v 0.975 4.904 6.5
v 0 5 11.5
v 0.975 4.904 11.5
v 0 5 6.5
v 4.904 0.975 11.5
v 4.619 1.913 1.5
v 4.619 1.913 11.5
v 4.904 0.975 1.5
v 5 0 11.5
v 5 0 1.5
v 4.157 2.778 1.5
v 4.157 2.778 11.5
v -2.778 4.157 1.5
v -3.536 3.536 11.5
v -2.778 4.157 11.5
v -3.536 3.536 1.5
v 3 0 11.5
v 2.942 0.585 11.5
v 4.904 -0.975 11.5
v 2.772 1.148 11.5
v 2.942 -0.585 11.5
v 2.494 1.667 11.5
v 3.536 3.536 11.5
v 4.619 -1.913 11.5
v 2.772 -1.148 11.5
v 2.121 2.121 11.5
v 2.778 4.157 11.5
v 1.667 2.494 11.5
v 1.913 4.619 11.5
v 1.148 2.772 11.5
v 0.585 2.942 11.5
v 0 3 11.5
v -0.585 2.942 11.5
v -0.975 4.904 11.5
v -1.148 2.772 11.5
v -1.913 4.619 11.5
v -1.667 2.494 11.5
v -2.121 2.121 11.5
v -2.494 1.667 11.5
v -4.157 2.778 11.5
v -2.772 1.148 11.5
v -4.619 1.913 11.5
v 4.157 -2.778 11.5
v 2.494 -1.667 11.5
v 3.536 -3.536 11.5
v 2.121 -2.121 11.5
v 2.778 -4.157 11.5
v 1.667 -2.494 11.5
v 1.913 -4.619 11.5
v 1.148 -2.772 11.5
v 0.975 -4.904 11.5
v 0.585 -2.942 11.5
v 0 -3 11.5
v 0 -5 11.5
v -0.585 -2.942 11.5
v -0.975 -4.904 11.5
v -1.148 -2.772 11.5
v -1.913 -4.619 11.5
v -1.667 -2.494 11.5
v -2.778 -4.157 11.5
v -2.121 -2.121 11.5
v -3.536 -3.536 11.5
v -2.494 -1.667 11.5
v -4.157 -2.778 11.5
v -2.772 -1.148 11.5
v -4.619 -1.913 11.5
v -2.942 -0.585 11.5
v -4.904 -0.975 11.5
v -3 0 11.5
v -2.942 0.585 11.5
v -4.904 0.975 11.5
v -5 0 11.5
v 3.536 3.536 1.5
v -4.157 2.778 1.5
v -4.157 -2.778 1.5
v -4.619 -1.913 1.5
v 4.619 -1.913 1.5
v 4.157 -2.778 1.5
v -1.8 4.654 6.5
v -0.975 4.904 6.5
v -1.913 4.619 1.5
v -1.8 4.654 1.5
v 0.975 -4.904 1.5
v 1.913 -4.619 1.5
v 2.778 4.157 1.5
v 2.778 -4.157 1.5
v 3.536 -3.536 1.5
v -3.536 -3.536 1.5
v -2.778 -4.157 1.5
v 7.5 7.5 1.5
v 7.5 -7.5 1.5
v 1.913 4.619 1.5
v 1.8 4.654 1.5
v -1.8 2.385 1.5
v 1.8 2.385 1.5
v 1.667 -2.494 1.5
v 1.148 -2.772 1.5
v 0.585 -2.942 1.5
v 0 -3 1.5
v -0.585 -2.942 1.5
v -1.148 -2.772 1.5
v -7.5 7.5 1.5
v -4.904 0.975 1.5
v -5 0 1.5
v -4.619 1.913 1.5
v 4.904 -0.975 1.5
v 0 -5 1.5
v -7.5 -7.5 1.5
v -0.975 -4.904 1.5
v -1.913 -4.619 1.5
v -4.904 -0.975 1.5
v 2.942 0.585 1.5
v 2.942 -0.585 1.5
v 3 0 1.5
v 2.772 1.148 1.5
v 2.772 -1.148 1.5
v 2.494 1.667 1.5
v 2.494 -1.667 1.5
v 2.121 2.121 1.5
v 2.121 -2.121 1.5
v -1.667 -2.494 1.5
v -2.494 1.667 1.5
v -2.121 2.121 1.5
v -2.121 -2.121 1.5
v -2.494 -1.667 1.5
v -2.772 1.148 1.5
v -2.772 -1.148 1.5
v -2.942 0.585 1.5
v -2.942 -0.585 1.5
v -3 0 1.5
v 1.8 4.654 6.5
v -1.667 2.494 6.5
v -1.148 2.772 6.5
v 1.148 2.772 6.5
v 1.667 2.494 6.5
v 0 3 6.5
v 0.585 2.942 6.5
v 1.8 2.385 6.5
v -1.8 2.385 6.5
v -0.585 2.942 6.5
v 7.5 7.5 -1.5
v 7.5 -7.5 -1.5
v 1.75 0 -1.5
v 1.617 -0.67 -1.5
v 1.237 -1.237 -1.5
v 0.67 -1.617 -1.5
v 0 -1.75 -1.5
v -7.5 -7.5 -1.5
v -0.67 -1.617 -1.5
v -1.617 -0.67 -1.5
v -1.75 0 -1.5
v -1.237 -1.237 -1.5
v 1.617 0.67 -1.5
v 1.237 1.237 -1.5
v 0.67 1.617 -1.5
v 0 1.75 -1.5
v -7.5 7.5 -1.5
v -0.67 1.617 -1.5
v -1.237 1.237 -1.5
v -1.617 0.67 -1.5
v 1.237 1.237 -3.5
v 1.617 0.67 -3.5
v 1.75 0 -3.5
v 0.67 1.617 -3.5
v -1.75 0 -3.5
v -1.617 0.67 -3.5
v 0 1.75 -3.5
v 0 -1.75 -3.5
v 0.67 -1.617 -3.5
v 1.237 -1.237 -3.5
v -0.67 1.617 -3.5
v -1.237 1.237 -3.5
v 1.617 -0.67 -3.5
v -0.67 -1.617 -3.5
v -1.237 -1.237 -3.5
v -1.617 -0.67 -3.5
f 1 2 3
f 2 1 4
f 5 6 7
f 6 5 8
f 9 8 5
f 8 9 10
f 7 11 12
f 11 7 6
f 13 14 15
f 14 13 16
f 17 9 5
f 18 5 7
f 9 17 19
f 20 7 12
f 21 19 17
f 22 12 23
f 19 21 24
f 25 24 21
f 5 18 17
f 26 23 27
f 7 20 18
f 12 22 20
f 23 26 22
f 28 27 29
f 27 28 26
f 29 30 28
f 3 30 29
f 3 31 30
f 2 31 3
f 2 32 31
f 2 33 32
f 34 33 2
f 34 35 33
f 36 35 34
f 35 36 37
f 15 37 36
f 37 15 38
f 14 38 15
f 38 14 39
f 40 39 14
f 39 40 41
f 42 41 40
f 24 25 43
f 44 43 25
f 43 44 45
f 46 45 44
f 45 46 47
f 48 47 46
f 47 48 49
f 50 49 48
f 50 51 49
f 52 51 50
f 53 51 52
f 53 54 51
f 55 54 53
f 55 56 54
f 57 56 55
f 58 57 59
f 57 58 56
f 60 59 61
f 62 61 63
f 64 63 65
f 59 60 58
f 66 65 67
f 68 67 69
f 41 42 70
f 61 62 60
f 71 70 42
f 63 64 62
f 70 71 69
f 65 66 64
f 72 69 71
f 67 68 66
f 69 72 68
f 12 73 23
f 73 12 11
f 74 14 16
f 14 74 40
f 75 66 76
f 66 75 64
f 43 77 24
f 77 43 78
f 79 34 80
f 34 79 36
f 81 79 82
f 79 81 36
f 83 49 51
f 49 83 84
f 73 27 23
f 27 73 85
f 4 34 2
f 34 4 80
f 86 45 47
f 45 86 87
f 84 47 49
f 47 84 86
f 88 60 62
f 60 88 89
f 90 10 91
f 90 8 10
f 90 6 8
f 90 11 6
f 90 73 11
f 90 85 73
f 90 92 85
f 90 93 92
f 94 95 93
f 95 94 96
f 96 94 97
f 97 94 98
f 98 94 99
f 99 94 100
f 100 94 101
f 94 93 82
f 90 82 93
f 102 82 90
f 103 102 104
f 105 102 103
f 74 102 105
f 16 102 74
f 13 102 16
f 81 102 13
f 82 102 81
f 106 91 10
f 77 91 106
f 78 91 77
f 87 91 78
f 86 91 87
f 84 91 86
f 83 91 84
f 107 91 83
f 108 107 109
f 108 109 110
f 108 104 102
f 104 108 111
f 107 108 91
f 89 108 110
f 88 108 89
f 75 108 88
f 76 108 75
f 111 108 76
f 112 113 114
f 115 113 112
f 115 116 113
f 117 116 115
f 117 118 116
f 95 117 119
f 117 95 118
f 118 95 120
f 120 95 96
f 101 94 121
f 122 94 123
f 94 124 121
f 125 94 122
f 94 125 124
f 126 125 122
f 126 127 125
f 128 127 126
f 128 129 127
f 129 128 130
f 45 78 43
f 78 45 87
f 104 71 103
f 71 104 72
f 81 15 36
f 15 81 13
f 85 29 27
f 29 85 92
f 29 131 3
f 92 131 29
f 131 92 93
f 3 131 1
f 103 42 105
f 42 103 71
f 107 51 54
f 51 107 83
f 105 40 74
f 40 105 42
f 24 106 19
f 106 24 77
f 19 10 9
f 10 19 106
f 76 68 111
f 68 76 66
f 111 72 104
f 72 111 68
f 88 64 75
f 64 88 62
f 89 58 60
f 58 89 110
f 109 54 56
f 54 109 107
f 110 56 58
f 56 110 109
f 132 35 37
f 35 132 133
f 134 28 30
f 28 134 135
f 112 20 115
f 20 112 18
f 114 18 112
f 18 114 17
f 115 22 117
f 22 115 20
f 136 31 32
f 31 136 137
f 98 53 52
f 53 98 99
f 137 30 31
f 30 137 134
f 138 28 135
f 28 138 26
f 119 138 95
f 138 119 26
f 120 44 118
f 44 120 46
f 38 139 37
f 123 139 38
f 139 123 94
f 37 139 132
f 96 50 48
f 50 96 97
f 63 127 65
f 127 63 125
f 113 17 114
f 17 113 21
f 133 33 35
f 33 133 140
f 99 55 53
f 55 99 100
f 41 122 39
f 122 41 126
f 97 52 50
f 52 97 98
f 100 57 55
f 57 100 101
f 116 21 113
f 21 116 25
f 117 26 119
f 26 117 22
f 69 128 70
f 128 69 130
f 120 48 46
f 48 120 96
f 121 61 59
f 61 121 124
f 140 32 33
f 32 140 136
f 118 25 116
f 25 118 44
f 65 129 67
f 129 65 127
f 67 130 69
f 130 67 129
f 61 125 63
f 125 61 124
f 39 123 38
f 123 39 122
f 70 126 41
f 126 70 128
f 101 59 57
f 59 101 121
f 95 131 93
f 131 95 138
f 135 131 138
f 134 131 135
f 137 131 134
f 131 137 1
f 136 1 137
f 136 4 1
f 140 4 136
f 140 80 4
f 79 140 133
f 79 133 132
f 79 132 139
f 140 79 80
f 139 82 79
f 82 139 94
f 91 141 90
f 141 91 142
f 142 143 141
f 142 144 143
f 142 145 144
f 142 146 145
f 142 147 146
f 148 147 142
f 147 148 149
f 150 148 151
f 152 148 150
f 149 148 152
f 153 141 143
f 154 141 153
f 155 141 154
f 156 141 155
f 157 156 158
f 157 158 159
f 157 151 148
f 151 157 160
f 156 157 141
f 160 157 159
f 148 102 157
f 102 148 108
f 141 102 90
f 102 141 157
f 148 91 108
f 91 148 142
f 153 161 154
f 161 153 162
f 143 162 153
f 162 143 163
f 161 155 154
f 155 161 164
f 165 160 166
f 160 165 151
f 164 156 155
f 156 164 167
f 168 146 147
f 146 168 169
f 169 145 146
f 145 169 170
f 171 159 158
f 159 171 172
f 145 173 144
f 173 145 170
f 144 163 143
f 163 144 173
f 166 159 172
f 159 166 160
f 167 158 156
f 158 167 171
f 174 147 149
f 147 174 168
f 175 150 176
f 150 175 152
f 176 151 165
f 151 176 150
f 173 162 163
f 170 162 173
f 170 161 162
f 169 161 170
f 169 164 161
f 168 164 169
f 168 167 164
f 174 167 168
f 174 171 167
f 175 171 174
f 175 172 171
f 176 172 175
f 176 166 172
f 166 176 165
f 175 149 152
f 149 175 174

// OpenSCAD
// Cable Clip - Simple utility print

/* [Clip Dimensions] */
cable_diameter = 6;   // [3:1:12] Cable diameter
wall = 2;             // [1.5:0.5:4] Wall thickness
base_width = 15;      // [10:25]
base_height = 3;      // [2:5]
screw_hole = 3.5;     // [2:5] Screw hole diameter

clip_radius = cable_diameter/2 + wall;
clip_height = clip_radius * 2;
gap = cable_diameter * 0.6;

// Base plate
cube([base_width, base_width, base_height], center=true);

// Clip
translate([0, 0, base_height/2])
    difference() {
        cylinder(h=clip_height, r=clip_radius, $fn=32);
        // Cable channel
        translate([0, 0, -1])
            cylinder(h=clip_height+2, r=cable_diameter/2, $fn=32);
        // Entry gap
        translate([0, clip_radius/2, -1])
            cube([gap, clip_radius, clip_height+2], center=true);
    }

// Screw hole
translate([0, 0, -1])
    cylinder(h=base_height+2, d=screw_hole, center=true, $fn=16);
